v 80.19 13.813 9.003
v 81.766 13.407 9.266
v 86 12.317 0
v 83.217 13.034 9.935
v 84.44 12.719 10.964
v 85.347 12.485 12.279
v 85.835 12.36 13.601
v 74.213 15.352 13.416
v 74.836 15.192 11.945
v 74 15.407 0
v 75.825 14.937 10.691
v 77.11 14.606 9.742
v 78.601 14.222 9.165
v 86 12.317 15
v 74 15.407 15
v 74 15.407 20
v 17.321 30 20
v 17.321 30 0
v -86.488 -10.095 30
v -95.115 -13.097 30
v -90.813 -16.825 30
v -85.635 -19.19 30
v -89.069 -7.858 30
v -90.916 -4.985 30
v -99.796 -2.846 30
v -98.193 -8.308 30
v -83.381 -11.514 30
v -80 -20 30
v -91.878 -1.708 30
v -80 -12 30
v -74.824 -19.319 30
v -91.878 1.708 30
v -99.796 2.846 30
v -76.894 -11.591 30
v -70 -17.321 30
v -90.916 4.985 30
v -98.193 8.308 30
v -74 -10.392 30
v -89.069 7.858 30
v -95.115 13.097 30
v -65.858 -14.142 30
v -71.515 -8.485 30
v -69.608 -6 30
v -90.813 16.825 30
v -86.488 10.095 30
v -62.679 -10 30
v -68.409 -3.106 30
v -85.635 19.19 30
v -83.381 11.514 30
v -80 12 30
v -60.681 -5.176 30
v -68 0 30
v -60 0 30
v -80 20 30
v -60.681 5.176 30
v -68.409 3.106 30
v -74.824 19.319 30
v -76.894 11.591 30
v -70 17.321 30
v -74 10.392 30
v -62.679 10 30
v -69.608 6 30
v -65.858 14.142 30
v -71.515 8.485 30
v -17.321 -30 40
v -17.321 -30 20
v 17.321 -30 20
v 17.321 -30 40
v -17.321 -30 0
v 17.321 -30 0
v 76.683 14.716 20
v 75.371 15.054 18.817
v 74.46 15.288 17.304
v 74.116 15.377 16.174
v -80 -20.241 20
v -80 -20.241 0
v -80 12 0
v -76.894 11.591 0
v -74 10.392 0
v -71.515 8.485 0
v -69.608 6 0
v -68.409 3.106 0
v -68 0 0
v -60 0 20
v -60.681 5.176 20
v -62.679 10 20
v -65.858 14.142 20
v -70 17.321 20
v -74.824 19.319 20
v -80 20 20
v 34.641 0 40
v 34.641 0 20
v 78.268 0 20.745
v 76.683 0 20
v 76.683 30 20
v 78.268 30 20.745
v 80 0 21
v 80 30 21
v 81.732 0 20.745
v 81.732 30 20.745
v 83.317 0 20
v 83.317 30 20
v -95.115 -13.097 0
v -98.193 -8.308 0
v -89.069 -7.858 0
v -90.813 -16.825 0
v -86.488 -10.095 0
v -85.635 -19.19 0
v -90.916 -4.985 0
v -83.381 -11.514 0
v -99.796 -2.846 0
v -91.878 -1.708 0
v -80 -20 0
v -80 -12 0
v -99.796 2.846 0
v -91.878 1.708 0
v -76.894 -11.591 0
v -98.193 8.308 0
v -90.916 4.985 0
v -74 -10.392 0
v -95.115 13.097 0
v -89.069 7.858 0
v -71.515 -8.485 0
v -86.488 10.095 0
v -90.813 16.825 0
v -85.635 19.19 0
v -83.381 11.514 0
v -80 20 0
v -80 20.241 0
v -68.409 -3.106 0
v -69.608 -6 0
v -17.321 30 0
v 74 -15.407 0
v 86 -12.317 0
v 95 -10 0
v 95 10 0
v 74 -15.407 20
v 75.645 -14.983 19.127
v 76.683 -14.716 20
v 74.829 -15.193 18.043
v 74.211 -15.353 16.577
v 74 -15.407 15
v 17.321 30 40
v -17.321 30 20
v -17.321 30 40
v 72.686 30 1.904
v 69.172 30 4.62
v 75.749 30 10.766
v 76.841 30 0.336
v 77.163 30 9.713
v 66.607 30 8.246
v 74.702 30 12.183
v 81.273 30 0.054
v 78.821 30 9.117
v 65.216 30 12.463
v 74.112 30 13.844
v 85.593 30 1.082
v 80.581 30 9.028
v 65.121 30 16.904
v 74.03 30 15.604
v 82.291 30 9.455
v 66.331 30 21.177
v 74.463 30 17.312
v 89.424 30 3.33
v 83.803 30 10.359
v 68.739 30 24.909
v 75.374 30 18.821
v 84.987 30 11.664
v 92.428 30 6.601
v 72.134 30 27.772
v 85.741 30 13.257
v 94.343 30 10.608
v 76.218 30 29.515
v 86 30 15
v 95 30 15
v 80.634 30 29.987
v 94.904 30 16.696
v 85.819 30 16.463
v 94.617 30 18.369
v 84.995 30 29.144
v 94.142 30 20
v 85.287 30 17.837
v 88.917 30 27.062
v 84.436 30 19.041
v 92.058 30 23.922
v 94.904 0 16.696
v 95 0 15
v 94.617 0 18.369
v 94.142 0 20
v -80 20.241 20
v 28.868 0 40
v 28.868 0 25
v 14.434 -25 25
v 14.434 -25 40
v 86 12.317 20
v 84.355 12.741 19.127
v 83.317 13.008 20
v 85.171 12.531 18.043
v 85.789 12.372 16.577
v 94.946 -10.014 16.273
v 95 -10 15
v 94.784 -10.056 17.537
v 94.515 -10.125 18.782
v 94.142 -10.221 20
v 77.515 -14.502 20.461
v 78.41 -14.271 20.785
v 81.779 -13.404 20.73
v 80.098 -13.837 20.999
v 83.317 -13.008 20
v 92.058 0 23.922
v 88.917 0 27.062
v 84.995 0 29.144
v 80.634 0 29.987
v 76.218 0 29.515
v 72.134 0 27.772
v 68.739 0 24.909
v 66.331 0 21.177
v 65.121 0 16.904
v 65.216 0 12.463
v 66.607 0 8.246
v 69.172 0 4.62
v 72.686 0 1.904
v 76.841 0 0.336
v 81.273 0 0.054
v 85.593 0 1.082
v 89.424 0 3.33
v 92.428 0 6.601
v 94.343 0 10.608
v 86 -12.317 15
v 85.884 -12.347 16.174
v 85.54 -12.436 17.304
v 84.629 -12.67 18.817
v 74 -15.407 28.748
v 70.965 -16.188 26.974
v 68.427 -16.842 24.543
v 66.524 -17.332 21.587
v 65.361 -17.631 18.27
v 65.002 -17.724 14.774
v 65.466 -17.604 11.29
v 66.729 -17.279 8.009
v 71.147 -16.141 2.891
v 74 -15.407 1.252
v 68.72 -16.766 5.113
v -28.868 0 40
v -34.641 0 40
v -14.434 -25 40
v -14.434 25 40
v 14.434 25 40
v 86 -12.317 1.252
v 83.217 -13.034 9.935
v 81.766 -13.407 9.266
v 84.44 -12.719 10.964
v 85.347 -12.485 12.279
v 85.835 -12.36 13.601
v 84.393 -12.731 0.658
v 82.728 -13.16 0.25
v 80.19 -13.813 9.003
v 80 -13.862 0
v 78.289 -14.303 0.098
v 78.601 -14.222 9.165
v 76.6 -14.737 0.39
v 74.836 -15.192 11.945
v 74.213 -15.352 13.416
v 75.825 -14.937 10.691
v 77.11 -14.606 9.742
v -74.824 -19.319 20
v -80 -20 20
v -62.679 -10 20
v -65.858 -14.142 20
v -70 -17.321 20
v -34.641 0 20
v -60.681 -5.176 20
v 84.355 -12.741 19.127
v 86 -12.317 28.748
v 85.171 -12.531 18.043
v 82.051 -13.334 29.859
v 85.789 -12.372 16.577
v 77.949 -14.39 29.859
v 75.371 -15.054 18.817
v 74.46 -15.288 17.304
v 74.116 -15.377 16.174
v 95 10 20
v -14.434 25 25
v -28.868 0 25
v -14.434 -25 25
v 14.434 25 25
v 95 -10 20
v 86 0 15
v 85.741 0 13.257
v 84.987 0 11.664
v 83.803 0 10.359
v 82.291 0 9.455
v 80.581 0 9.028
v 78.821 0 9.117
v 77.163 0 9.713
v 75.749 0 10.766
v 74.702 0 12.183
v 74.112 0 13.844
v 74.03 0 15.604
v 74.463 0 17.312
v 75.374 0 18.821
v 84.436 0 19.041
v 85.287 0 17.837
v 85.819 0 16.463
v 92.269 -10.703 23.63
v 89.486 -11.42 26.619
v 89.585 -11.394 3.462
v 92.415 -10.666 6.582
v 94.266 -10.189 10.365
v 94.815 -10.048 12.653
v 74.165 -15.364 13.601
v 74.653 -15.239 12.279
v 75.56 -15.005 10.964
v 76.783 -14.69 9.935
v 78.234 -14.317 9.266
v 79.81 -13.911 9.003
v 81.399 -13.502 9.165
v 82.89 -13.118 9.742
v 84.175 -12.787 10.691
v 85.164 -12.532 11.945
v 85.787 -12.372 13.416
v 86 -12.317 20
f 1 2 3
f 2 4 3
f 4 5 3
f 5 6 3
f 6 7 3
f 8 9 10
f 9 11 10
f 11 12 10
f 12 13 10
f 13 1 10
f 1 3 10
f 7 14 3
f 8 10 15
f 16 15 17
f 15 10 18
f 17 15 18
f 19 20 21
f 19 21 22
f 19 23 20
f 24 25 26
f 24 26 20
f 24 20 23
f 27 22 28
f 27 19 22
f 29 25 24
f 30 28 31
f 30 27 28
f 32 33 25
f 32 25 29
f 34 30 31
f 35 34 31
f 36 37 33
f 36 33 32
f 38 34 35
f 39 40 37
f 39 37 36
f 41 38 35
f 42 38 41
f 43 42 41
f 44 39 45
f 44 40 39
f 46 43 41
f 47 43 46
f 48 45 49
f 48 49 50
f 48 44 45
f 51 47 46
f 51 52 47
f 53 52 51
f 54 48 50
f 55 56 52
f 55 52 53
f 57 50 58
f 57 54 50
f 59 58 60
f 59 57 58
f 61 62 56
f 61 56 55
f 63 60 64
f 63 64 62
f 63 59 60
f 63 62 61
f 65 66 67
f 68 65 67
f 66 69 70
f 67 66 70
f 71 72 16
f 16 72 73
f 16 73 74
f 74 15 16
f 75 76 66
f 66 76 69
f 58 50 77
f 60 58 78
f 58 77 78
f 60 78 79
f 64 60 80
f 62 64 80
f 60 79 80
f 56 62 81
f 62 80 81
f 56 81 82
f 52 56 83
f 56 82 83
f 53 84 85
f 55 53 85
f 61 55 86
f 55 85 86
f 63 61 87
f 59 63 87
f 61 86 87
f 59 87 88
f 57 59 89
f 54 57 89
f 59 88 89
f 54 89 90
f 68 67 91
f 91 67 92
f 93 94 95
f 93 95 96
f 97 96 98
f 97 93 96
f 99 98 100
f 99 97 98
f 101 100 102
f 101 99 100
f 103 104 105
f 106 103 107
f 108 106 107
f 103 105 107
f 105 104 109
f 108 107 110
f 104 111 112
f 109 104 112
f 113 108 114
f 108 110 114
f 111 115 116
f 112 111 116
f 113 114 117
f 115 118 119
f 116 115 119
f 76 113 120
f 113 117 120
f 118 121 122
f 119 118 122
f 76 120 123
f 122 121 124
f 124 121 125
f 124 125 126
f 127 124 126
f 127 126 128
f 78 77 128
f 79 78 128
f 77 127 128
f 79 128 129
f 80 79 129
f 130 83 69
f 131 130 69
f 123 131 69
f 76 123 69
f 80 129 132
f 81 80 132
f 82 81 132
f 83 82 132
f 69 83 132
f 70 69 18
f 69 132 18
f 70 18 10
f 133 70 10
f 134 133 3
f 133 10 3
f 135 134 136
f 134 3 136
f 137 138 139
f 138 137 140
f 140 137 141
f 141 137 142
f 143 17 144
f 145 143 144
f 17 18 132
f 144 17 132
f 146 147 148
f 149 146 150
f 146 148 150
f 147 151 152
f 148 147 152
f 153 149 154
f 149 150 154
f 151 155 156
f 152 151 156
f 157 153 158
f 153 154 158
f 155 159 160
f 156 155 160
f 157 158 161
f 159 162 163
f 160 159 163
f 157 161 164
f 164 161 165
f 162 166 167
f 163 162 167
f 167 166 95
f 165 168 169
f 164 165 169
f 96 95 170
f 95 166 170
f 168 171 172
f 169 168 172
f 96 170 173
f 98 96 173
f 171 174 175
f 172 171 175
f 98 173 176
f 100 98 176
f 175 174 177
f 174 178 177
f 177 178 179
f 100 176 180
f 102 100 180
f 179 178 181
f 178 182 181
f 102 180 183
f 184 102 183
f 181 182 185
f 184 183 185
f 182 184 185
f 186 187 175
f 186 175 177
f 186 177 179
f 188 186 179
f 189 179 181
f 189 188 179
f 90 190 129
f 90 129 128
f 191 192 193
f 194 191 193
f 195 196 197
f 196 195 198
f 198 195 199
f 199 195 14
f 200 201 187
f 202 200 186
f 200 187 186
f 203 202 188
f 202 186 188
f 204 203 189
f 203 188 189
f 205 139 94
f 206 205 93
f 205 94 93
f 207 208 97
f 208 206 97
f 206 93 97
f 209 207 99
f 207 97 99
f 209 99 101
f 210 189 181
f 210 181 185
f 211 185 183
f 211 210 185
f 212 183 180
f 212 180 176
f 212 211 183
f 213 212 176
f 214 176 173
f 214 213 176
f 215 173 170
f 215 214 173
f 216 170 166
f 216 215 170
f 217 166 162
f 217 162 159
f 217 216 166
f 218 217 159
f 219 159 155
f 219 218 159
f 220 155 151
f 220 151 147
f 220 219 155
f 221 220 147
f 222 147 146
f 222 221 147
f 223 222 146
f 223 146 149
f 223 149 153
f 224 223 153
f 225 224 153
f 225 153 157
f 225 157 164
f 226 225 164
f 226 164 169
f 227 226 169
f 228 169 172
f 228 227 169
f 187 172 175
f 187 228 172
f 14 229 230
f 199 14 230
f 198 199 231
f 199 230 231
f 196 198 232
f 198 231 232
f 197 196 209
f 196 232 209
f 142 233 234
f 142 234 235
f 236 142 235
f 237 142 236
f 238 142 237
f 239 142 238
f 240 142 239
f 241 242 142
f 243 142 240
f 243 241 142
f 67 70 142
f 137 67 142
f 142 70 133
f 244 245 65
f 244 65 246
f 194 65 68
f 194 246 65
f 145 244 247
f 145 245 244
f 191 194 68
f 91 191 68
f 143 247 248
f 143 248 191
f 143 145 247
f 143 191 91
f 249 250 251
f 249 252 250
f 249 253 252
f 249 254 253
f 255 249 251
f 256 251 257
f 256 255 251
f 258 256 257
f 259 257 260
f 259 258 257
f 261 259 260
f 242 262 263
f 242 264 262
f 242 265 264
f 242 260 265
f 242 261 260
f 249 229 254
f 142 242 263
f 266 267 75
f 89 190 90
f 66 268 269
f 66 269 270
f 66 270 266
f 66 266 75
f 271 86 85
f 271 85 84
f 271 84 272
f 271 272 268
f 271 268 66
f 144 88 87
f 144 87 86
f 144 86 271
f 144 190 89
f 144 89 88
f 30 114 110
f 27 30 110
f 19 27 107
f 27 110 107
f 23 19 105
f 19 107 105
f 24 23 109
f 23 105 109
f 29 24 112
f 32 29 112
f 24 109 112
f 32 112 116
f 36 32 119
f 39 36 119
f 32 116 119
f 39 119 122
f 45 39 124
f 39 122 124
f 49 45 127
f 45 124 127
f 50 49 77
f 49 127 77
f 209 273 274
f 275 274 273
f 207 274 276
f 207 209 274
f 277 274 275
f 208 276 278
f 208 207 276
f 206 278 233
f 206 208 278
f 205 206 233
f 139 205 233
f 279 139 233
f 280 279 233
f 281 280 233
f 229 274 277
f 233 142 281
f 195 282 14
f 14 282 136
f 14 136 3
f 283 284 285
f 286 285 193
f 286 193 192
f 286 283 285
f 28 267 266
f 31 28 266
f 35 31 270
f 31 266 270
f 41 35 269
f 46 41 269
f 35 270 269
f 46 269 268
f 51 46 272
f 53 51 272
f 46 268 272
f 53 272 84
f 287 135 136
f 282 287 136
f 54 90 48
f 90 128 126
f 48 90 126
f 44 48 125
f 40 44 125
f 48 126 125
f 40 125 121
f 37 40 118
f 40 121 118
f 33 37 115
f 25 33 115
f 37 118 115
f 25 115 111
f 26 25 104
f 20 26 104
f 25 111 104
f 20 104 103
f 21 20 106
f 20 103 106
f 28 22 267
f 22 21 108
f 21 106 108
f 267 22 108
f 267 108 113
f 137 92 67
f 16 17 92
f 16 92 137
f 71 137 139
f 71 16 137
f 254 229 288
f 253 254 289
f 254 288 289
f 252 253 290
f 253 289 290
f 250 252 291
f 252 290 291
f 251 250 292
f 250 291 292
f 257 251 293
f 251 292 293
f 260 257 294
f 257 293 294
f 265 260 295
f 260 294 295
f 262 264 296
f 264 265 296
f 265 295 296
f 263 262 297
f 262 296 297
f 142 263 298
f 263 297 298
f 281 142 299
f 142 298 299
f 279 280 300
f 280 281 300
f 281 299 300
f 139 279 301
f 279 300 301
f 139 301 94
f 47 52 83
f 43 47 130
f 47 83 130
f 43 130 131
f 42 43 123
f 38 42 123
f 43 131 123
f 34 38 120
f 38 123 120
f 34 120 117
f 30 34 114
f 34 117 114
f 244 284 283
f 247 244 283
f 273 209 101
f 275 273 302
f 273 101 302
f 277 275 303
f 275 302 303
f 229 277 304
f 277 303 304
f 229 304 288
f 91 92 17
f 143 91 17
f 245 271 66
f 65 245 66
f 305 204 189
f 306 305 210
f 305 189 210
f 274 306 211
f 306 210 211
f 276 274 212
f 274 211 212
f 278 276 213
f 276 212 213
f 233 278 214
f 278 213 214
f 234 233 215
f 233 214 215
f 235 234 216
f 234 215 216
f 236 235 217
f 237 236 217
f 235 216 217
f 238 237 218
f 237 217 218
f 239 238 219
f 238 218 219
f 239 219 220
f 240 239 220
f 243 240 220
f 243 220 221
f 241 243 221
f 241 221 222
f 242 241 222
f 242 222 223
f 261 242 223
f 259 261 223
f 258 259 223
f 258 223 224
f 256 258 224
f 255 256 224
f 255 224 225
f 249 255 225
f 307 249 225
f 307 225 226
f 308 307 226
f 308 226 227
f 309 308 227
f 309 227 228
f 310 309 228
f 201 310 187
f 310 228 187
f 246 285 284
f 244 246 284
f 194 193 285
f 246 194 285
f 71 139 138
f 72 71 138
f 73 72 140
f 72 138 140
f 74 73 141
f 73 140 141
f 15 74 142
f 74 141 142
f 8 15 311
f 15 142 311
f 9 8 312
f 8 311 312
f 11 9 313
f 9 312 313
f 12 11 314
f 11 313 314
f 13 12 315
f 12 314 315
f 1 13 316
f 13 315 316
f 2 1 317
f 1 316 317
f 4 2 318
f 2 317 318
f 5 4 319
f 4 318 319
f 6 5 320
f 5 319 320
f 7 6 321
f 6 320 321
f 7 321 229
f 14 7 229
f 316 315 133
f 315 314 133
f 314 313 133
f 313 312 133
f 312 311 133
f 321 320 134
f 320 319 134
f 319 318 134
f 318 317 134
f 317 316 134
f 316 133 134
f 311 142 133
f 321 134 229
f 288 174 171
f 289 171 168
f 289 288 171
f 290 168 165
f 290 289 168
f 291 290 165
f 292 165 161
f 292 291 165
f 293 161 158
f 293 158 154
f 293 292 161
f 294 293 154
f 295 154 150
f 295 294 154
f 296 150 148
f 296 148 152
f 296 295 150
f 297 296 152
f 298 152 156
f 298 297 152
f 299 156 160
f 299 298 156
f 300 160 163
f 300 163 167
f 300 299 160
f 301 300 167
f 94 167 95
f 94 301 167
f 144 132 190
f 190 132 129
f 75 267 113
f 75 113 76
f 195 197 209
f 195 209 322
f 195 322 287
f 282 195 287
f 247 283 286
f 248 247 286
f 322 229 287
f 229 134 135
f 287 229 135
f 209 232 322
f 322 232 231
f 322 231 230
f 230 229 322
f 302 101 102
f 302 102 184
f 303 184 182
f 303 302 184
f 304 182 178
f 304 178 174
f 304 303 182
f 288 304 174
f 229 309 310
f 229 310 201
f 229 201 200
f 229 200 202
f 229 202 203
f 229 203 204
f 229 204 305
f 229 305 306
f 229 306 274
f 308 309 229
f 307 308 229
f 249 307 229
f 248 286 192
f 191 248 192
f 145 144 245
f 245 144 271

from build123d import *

# Parameters (mm, degrees)
F1_DEPTH      = 40
F2_DEPTH      = 25
F3_DEPTH      = 20
F4_DEPTH      = 20
F5_DEPTH      = 30
F7_DEPTH      = 30
F7_DEPTH_BACK = 30
F9_DEPTH      = 70.8
F11_DEPTH     = 43.2


with BuildPart() as f1:
    # F0 (on Top) → F1 (new body)
    with BuildSketch(Plane.XY):
        Polygon((17.3205080757, 30), (-17.3205080757, 30), (-34.6410161514, 0), (-17.3205080757, -30), (0, -30), (17.3205080757, -30), (34.6410161514, 0), align=None)
        Polygon((-28.8675134595, 0), (-14.4337567297, 25), (14.4337567297, 25), (28.8675134595, 0), (14.4337567297, -25), (-14.4337567297, -25), align=None, mode=Mode.SUBTRACT)
    extrude(amount=F1_DEPTH)

    # F0 (on Top) → F2 (join)
    with BuildSketch(Plane.XY):
        Polygon((14.4337567297, 25), (-14.4337567297, 25), (-28.8675134595, 0), (-14.4337567297, -25), (14.4337567297, -25), (28.8675134595, 0), align=None)
    extrude(amount=F2_DEPTH)

    # F0 (on Top) → F3 (join)
    with BuildSketch(Plane.XY):
        Polygon((74, 15.4068324804), (17.3205080757, 30), (34.6410161514, 0), (17.3205080757, -30), (74, -15.4068324804), (74, -10), (74, 10), align=None)
        with BuildLine():
            Line((-34.6410161514, 0), (-17.3205080757, 30))
            Line((-17.3205080757, 30), (-80, 20.240965239))
            Line((-80, 20.240965239), (-80, 20))
            ThreePointArc((-80, 20), (-65.8578643763, 14.1421356237), (-60, 0))
            ThreePointArc((-60, 0), (-65.8578643763, -14.1421356237), (-80, -20))
            Line((-80, -20), (-80, -20.240965239))
            Line((-80, -20.240965239), (-17.3205080757, -30))
            Line((-17.3205080757, -30), (-34.6410161514, 0))
        make_face()
    extrude(amount=F3_DEPTH)

    # F0 (on Top) → F4 (join)
    with BuildSketch(Plane.XY):
        Polygon((86, 12.3172139202), (74, 15.4068324804), (74, 10), (74, -10), (74, -15.4068324804), (86, -12.3172139202), (86, -10), (86, 10), align=None)
        Polygon((95, 10), (86, 12.3172139202), (86, 10), (86, -10), (86, -12.3172139202), (95, -10), align=None)
    extrude(amount=F4_DEPTH)

    # F0 (on Top) → F5 (join)
    with BuildSketch(Plane.XY):
        with BuildLine():
            ThreePointArc((-60, 0), (-65.8578643763, 14.1421356237), (-80, 20))
            Line((-80, 20), (-80, 12))
            ThreePointArc((-80, 12), (-71.5147186258, 8.4852813742), (-68, 0))
            ThreePointArc((-68, 0), (-71.5147186258, -8.4852813742), (-80, -12))
            Line((-80, -12), (-80, -20))
            ThreePointArc((-80, -20), (-65.8578643763, -14.1421356237), (-60, 0))
        make_face()
        with BuildLine():
            Line((-80, 12), (-80, 20))
            ThreePointArc((-80, 20), (-100, 0), (-80, -20))
            Line((-80, -20), (-80, -12))
            ThreePointArc((-80, -12), (-92, 0), (-80, 12))
        make_face()
    extrude(amount=F5_DEPTH)

    # F8 (on face) → F9 (cut)
    with BuildSketch(Plane.XZ.offset(30)):
        with BuildLine():
            Line((83.3166247904, 20), (76.6833752096, 20))
            ThreePointArc((76.6833752096, 20), (77.1627256691, 9.7132359263), (86, 15))
            ThreePointArc((86, 15), (85.2867640737, 17.8372743309), (83.3166247904, 20))
        make_face()
    extrude(amount=-F9_DEPTH, mode=Mode.SUBTRACT)


with BuildPart() as f7:
    # F6 (on Front) → F7 (new body, two sides)
    with BuildSketch(Plane.XZ) as f7_sk:
        with BuildLine():
            ThreePointArc((65.8578643763, 20), (67.7525512861, 6.3397459622), (80, 0))
            ThreePointArc((80, 0), (90.6066017178, 4.3933982822), (95, 15))
            Line((95, 15), (86, 15))
            ThreePointArc((86, 15), (77.1627256691, 9.7132359263), (76.6833752096, 20))
            Line((76.6833752096, 20), (65.8578643763, 20))
        make_face()
        with BuildLine():
            ThreePointArc((94.1421356237, 20), (80, 30), (65.8578643763, 20))
            Line((65.8578643763, 20), (76.6833752096, 20))
            ThreePointArc((76.6833752096, 20), (80, 21), (83.3166247904, 20))
            Line((83.3166247904, 20), (94.1421356237, 20))
        make_face()
        with BuildLine():
            Line((86, 15), (95, 15))
            ThreePointArc((95, 15), (94.7839783948, 17.5365296809), (94.1421356237, 20))
            Line((94.1421356237, 20), (83.3166247904, 20))
            ThreePointArc((83.3166247904, 20), (85.2867640737, 17.8372743309), (86, 15))
        make_face()
    extrude(amount=F7_DEPTH)
    extrude(f7_sk.sketch, amount=-F7_DEPTH_BACK)

    # F0 (on Top) → F11 (cut)
    with BuildSketch(Plane.XY):
        Polygon((74, -15.4068324804), (17.3205080757, -30), (74, -30), align=None)
        Polygon((74, -15.4068324804), (74, -30), (80, -30), (86, -30), (86, -12.3172139202), align=None)
        Polygon((95, -10), (86, -12.3172139202), (86, -30), (95, -30), align=None)
    extrude(amount=F11_DEPTH, mode=Mode.SUBTRACT)


solid = Compound([f1.part, f7.part])
